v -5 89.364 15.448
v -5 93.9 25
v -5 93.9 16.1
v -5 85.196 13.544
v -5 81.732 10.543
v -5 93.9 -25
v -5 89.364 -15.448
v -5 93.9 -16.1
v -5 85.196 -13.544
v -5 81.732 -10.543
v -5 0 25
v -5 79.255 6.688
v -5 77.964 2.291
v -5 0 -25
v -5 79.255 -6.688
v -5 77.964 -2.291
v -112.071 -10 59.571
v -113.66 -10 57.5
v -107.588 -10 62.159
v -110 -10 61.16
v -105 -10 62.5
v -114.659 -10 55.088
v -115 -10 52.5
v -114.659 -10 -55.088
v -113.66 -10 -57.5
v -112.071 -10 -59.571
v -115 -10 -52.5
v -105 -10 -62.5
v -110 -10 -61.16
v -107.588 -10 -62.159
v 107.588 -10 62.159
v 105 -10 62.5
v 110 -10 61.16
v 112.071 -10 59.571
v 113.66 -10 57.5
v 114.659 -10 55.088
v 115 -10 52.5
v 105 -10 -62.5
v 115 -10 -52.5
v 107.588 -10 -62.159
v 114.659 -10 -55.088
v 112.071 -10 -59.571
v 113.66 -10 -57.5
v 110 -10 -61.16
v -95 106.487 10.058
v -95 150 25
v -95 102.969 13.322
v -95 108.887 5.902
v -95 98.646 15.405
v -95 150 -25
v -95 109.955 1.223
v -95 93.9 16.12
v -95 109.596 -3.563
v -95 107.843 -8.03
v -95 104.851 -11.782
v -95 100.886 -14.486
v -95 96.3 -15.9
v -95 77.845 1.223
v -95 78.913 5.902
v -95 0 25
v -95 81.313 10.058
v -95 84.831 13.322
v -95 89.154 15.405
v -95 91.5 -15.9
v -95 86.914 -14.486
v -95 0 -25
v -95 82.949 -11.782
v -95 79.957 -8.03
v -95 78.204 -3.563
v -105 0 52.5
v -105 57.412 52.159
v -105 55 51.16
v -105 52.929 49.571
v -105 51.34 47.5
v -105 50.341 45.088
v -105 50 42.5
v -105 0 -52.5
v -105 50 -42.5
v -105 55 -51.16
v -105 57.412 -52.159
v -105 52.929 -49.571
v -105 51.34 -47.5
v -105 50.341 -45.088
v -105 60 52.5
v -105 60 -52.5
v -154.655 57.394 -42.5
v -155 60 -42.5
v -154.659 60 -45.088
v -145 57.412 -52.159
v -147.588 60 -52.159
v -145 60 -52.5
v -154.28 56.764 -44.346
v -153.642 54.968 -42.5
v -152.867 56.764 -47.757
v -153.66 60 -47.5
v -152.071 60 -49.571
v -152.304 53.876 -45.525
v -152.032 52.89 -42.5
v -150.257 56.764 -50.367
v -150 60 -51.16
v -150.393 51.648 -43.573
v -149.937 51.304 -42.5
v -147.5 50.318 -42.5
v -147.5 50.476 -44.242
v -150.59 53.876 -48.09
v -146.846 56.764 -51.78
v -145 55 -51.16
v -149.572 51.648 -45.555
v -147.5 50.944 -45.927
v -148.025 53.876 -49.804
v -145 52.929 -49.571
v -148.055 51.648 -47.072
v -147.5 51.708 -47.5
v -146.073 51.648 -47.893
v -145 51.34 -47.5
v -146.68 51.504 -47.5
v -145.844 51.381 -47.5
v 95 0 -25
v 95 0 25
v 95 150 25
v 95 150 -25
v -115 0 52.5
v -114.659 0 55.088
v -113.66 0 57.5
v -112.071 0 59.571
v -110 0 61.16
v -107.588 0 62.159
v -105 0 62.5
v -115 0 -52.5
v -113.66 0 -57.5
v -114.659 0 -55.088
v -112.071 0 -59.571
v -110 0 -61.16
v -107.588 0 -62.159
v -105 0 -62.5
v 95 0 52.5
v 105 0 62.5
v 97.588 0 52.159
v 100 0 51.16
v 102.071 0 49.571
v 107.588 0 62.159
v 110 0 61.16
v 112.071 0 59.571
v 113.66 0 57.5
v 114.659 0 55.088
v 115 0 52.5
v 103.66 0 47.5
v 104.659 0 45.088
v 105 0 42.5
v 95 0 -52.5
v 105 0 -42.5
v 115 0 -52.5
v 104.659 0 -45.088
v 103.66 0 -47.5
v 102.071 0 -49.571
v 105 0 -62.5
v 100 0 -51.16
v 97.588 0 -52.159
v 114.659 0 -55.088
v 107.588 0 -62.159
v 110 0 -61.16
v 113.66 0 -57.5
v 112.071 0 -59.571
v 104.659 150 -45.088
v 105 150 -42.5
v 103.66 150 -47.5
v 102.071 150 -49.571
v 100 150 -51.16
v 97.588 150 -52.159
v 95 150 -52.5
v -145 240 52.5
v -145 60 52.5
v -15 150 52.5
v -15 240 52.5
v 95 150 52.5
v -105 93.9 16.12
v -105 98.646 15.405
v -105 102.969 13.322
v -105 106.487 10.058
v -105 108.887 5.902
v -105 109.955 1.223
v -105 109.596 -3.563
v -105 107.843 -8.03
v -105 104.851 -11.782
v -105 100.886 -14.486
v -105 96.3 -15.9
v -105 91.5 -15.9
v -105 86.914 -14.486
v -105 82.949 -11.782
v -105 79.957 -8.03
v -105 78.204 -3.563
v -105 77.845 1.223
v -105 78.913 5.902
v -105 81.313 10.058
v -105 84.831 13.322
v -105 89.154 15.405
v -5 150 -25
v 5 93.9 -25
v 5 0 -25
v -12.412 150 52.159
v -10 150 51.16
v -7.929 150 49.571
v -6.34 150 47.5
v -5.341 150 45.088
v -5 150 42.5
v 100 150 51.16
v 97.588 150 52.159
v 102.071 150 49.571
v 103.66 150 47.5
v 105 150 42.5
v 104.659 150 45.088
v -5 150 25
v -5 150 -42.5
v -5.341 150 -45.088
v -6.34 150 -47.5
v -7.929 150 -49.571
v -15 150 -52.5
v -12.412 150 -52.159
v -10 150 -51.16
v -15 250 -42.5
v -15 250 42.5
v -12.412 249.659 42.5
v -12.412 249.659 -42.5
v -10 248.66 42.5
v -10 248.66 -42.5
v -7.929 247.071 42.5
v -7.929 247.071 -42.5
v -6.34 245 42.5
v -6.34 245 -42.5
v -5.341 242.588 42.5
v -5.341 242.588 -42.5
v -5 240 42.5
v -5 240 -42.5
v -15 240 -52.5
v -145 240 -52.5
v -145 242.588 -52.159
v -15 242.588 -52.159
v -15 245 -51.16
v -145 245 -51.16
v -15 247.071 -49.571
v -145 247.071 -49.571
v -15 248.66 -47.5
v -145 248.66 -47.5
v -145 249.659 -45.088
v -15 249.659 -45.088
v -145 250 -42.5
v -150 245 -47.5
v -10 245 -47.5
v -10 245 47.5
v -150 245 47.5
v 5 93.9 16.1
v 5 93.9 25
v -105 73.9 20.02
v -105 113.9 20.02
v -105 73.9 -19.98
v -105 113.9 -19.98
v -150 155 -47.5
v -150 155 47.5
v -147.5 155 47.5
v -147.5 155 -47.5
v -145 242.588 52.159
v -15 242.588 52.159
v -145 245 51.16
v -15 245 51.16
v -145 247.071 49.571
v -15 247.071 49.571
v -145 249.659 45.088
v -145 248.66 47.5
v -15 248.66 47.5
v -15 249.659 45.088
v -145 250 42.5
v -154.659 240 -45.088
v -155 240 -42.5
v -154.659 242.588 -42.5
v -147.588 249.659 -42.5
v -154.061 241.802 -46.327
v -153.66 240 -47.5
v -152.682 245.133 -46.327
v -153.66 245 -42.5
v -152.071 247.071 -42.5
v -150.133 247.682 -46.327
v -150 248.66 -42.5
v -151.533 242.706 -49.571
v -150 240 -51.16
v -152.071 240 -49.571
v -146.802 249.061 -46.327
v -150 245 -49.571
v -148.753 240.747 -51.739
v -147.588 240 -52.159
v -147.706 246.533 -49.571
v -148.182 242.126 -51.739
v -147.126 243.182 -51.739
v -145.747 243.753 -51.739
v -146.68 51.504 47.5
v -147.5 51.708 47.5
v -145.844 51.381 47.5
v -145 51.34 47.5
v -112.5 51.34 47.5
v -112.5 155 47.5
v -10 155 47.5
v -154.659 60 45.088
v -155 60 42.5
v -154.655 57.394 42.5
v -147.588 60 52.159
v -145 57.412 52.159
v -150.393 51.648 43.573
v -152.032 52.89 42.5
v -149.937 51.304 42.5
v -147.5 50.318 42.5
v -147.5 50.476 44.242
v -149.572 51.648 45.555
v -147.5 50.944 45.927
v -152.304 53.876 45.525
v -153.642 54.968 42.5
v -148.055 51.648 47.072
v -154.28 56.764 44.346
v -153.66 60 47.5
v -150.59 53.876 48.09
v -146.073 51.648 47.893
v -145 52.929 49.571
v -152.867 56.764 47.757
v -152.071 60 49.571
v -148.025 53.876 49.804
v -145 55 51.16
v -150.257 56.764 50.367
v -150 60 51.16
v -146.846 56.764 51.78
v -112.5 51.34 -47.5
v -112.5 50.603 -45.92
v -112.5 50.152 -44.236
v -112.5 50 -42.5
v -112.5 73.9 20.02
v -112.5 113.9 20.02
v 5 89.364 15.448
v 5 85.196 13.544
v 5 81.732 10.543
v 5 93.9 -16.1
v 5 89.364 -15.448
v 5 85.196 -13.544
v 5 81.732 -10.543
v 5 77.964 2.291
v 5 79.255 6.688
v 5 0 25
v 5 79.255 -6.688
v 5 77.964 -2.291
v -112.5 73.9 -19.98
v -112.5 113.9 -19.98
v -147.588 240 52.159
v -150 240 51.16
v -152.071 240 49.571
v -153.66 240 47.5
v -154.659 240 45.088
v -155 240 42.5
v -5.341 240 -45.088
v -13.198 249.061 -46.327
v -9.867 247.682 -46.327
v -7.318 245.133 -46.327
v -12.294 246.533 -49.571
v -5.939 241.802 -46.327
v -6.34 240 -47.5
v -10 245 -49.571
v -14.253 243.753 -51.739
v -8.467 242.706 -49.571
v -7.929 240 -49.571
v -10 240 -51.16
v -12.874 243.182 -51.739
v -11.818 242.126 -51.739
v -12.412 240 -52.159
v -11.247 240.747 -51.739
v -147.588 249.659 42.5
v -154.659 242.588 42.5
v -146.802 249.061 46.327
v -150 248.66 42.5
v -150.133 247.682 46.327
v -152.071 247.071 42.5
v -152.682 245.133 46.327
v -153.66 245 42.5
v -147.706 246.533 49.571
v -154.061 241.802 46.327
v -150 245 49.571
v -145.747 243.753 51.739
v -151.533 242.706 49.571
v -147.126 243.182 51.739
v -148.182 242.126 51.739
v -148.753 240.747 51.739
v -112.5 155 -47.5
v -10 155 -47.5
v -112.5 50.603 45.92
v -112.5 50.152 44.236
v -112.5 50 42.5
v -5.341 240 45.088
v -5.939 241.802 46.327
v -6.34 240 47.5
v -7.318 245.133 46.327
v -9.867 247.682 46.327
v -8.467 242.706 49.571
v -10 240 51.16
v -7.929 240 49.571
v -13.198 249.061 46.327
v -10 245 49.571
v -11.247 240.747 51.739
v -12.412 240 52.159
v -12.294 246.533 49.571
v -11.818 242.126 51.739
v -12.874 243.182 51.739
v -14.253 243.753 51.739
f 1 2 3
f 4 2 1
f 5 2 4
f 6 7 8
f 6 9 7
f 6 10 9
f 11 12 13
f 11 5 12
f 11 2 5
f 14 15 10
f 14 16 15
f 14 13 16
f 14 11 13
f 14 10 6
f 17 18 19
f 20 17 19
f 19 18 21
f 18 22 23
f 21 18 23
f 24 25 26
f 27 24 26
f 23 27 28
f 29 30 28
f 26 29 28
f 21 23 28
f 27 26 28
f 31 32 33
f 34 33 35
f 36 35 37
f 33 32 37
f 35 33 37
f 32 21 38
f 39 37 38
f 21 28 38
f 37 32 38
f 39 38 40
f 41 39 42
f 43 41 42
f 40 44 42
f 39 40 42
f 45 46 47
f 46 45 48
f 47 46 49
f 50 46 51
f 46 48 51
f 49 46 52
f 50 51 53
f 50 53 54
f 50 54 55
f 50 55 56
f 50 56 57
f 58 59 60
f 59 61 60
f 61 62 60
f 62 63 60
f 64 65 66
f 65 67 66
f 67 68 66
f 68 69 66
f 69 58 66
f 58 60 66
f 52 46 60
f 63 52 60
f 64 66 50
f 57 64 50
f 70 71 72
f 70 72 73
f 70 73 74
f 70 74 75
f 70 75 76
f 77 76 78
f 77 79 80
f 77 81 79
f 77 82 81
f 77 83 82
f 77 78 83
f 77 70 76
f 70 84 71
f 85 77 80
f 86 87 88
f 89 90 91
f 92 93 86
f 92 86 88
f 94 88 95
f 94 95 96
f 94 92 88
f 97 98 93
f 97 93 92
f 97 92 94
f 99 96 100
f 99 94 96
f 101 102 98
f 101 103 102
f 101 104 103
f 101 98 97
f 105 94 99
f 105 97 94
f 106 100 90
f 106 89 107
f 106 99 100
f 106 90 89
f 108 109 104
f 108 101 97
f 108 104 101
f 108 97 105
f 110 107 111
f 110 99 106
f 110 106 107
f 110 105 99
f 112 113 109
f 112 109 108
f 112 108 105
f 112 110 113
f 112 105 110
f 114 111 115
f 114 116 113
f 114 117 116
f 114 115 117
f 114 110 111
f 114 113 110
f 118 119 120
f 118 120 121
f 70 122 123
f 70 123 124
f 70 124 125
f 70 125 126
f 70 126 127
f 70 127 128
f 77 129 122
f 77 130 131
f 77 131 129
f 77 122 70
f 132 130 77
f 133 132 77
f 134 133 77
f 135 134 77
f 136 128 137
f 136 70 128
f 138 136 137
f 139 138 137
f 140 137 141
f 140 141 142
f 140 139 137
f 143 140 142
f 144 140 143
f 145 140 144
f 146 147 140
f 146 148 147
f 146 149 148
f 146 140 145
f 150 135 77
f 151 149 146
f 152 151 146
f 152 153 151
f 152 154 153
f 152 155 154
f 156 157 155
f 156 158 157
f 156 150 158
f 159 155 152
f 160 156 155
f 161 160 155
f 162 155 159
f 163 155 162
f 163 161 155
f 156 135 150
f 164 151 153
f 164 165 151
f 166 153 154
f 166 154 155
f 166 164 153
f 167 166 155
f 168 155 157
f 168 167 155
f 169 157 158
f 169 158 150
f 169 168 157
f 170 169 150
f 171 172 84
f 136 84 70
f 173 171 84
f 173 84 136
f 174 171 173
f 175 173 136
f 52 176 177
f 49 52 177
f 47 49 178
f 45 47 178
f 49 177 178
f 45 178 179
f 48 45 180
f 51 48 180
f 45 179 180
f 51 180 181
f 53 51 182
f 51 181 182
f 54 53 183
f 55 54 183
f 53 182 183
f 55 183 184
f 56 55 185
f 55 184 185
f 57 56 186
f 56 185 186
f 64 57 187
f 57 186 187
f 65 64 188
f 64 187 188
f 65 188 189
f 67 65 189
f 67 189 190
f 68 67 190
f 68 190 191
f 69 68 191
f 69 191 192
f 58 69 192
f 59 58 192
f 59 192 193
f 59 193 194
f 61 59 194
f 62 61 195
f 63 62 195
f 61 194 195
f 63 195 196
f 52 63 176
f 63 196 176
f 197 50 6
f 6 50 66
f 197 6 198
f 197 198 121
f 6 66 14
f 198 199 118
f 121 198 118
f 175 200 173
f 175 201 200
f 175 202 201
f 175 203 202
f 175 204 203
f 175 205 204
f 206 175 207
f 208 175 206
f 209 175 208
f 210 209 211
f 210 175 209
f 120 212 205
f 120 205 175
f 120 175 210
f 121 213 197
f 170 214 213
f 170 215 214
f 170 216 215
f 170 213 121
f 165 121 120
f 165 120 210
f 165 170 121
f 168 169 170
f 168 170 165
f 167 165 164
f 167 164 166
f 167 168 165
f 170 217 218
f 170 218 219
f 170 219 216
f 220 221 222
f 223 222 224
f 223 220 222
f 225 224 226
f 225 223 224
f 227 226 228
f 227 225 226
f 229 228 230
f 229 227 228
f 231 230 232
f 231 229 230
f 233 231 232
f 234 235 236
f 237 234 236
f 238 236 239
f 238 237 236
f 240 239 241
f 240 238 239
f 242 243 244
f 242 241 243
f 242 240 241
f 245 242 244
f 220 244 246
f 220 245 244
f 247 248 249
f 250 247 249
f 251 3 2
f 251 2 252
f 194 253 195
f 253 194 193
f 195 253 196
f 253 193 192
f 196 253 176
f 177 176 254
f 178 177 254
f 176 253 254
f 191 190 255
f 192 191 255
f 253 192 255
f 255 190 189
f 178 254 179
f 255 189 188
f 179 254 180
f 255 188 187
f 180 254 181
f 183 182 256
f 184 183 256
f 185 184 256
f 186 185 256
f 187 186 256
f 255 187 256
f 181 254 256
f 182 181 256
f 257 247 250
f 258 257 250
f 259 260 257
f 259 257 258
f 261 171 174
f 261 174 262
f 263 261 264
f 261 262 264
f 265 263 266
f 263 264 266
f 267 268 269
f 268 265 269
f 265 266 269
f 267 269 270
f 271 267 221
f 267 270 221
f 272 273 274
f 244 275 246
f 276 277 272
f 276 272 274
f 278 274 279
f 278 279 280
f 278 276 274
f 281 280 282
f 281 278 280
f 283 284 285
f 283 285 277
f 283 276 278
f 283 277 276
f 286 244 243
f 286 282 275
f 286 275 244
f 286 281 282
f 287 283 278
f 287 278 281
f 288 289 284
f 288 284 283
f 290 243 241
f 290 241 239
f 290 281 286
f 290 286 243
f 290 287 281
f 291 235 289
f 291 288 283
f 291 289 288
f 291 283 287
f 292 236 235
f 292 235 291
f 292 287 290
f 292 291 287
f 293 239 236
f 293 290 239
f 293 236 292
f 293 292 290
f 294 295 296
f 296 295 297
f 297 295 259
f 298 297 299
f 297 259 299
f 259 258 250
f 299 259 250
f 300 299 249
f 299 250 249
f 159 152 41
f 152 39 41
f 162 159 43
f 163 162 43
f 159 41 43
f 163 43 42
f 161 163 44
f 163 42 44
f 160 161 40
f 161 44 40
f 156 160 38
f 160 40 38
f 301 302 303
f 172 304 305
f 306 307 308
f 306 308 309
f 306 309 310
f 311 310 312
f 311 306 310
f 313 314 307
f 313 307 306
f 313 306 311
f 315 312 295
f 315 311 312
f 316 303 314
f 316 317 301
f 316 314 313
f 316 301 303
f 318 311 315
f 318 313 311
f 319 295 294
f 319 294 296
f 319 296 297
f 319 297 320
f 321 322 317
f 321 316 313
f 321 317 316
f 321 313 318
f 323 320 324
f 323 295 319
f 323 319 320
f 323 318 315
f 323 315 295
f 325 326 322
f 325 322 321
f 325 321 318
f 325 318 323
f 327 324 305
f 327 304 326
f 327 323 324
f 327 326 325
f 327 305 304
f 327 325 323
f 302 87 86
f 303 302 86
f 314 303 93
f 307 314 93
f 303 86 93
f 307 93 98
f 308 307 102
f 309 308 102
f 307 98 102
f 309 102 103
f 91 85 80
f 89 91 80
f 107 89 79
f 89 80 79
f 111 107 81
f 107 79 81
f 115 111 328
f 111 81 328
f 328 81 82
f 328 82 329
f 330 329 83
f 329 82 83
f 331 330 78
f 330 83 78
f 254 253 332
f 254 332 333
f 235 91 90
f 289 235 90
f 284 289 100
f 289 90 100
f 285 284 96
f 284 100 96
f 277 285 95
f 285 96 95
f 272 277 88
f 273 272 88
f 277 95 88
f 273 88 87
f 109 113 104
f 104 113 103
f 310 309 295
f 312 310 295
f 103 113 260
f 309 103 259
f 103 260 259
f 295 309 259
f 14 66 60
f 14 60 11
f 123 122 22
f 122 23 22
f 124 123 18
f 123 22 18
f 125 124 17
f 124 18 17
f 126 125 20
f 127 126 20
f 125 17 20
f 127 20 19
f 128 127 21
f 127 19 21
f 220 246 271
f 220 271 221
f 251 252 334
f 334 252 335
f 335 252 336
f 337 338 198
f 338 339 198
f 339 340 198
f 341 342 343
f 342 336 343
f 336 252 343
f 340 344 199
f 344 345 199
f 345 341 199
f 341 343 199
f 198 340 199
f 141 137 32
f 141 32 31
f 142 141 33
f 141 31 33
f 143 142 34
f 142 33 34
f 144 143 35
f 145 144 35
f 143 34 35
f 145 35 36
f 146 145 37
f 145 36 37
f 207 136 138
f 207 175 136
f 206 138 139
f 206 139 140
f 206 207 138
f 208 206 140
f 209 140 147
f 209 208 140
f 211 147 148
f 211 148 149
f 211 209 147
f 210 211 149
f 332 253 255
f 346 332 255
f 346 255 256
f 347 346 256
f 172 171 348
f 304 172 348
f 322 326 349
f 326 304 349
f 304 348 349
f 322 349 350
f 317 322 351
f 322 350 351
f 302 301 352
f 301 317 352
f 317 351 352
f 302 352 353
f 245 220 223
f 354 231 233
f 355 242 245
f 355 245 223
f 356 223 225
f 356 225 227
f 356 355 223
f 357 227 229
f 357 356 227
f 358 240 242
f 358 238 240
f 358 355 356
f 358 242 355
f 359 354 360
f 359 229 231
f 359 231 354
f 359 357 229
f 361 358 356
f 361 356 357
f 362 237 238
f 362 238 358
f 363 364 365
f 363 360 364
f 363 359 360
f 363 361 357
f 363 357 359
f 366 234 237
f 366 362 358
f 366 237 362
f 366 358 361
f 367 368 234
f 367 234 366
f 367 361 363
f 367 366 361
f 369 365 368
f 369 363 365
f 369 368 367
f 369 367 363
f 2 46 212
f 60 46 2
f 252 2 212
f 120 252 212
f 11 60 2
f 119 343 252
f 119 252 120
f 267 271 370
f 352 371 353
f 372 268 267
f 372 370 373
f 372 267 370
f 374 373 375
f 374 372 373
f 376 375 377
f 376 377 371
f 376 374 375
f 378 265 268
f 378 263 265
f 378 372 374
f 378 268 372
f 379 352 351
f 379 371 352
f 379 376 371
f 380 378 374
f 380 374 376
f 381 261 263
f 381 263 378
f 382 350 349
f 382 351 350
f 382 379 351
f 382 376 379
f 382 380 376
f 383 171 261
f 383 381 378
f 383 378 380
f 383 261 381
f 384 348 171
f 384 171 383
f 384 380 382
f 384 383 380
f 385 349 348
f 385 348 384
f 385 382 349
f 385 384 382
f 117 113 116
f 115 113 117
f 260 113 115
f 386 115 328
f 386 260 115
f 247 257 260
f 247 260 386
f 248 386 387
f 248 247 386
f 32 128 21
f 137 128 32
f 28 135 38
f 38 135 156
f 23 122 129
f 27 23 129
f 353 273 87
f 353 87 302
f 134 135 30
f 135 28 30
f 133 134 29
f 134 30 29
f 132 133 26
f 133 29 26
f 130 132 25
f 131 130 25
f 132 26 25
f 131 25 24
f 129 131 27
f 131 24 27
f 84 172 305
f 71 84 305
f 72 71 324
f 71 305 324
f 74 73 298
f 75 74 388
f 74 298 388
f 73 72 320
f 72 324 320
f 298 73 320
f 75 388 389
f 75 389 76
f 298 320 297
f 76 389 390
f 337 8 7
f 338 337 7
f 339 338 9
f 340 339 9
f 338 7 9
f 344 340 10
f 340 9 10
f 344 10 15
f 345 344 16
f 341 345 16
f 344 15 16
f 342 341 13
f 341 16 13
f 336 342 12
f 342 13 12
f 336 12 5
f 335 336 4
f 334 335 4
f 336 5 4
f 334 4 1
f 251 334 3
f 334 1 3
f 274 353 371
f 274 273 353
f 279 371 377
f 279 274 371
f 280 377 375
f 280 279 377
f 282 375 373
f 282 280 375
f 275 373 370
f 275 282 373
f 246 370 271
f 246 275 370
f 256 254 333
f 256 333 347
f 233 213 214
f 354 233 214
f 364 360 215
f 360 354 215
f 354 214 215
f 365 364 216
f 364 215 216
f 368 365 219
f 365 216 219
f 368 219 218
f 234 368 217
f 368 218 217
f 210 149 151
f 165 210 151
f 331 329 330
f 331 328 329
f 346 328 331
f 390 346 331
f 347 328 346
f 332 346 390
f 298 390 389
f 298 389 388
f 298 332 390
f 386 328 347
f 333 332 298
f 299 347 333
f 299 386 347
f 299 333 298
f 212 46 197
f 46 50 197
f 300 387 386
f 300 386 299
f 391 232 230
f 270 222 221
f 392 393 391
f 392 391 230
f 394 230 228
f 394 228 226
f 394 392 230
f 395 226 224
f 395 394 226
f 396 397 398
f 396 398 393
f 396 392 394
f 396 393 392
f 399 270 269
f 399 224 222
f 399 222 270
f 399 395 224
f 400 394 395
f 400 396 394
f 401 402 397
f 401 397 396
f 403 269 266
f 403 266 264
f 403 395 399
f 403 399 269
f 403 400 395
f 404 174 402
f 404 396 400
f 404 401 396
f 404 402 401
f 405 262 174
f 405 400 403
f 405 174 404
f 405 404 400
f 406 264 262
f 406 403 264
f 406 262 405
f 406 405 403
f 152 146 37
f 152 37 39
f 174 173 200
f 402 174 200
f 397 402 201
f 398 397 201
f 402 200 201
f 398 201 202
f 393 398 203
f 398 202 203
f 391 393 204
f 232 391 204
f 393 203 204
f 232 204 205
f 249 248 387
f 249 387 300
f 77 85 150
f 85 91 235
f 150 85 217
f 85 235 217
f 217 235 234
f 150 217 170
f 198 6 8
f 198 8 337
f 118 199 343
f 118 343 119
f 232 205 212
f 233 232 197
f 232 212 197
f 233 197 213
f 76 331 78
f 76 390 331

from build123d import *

# Parameters (mm, degrees)
SKETCH2_W               = 210
SKETCH2_H               = 105
SKETCH2_W_2             = 190
SKETCH2_H_2             = 50
BOSS_EXTRUDE2_DEPTH     = 150
FILLET3_R               = 10
FILLET4_R               = 10
SKETCH4_W               = 230
SKETCH4_H               = 125
BOSS_EXTRUDE3_DEPTH     = 10
FILLET5_R               = 10
FILLET6_R               = 10
FILLET7_R               = 10
FILLET8_R               = 10
SKETCH7_W               = 10
SKETCH7_H               = 50
BOSS_EXTRUDE4_DEPTH     = 93.9
SKETCH8_R               = 16.1
CUT_EXTRUDE2_DEPTH      = 10
SKETCH10_R              = 16.1
CUT_EXTRUDE3_DEPTH      = 10
SKETCH14_W              = 150
SKETCH14_H              = 105
BOSS_EXTRUDE6_DEPTH     = 100
CUT_EXTRUDE4_DEPTH      = 1
CUT_EXTRUDE4_DEPTH_BACK = 145
SKETCH19_W              = 95
SKETCH19_H              = 90
SKETCH22_W              = 50
SKETCH22_H              = 105
SKETCH22_W_2            = 35
SKETCH22_H_2            = 95
BOSS_EXTRUDE7_DEPTH     = 100
SKETCH24_W              = 40
SKETCH24_H              = 40
CUT_EXTRUDE5_DEPTH      = 10
SKETCH25_W              = 95.055428317
SKETCH25_H              = 90
BOSS_EXTRUDE9_DEPTH     = 5
FILLET9_R               = 10
FILLET10_R              = 10
FILLET11_R              = 10
FILLET12_R              = 10
FILLET13_R              = 10
FILLET15_R              = 10
SKETCH28_W              = 35
SKETCH28_H              = 95
CUT_EXTRUDE7_DEPTH      = 5


with BuildPart() as part:
    # Sketch2 → Boss-Extrude2 (new body)
    with BuildSketch(Plane(origin=(0, 0, 0), x_dir=(1, 0, 0), z_dir=(0, 1, 0))):
        Rectangle(SKETCH2_W, SKETCH2_H)
        Rectangle(SKETCH2_W_2, SKETCH2_H_2, mode=Mode.SUBTRACT)
    extrude(amount=BOSS_EXTRUDE2_DEPTH)

    # Fillet3
    fillet3_edges = [part.edges().sort_by_distance(p)[0] for p in [
        (105, 75, 52.5),
    ]]
    fillet(fillet3_edges, radius=FILLET3_R)

    # Fillet4
    fillet4_edges = [part.edges().sort_by_distance(p)[0] for p in [
        (105, 75, -52.5),
    ]]
    fillet(fillet4_edges, radius=FILLET4_R)

    # Sketch4 → Boss-Extrude3 (add)
    with BuildSketch(Plane(origin=(0, 0, 0), x_dir=(1, 0, 0), z_dir=(0, 1, 0))):
        Rectangle(SKETCH4_W, SKETCH4_H)
    extrude(amount=-BOSS_EXTRUDE3_DEPTH)

    # Fillet5
    fillet5_edges = [part.edges().sort_by_distance(p)[0] for p in [
        (115, -5, 62.5),
    ]]
    fillet(fillet5_edges, radius=FILLET5_R)

    # Fillet6
    fillet6_edges = [part.edges().sort_by_distance(p)[0] for p in [
        (115, -5, -62.5),
    ]]
    fillet(fillet6_edges, radius=FILLET6_R)

    # Fillet7
    fillet7_edges = [part.edges().sort_by_distance(p)[0] for p in [
        (-115, -5, -62.5),
    ]]
    fillet(fillet7_edges, radius=FILLET7_R)

    # Fillet8
    fillet8_edges = [part.edges().sort_by_distance(p)[0] for p in [
        (-115, -5, 62.5),
    ]]
    fillet(fillet8_edges, radius=FILLET8_R)

    # Sketch7 → Boss-Extrude4 (add)
    with BuildSketch(Plane(origin=(0, 0, 0), x_dir=(1, 0, 0), z_dir=(0, 1, 0))):
        Rectangle(SKETCH7_W, SKETCH7_H)
    extrude(amount=BOSS_EXTRUDE4_DEPTH)

    # Sketch8 → Cut-Extrude2 (cut)
    with BuildSketch(Plane.ZY.offset(5)):
        with Locations((0, 93.9)):
            Circle(SKETCH8_R)
    extrude(amount=-CUT_EXTRUDE2_DEPTH, mode=Mode.SUBTRACT)

    # Sketch10 → Cut-Extrude3 (cut)
    with BuildSketch(Plane.ZY.offset(105)):
        with Locations((0.019819576, 93.900003501)):
            Circle(SKETCH10_R)
    extrude(amount=-CUT_EXTRUDE3_DEPTH, mode=Mode.SUBTRACT)

    # Sketch14 → Boss-Extrude6 (add)
    with BuildSketch(Plane(origin=(0, 150, 0), x_dir=(1, 0, 0), z_dir=(0, 1, 0))):
        with Locations((-80, 0)):
            Rectangle(SKETCH14_W, SKETCH14_H)
    extrude(amount=BOSS_EXTRUDE6_DEPTH)

    # Sketch19 → Cut-Extrude4 (cut, two sides: drawn at the far end of the back side and taken through both)
    with BuildSketch(Plane.ZY.offset(155).offset(-CUT_EXTRUDE4_DEPTH_BACK)):
        with Locations((0, 200)):
            Rectangle(SKETCH19_W, SKETCH19_H)
    extrude(amount=CUT_EXTRUDE4_DEPTH + CUT_EXTRUDE4_DEPTH_BACK, mode=Mode.SUBTRACT)

    # Sketch22 → Boss-Extrude7 (add)
    with BuildSketch(Plane.XZ.offset(-150)):
        with Locations((-130, 0)):
            Rectangle(SKETCH22_W, SKETCH22_H)
        with Locations((-130, 0)):
            Rectangle(SKETCH22_W_2, SKETCH22_H_2, mode=Mode.SUBTRACT)
    extrude(amount=BOSS_EXTRUDE7_DEPTH)

    # Sketch24 → Cut-Extrude5 (cut)
    with BuildSketch(Plane(origin=(-105, 0, 0), x_dir=(0, 0, -1), z_dir=(1, 0, 0))):
        with Locations((-0.019819576, 93.900003501)):
            Rectangle(SKETCH24_W, SKETCH24_H)
    extrude(amount=-CUT_EXTRUDE5_DEPTH, mode=Mode.SUBTRACT)

    # Sketch25 → Boss-Extrude9 (add)
    with BuildSketch(Plane.ZY.offset(155)):
        with Locations((0.027714159, 200)):
            Rectangle(SKETCH25_W, SKETCH25_H)
    extrude(amount=-BOSS_EXTRUDE9_DEPTH)

    # Fillet9
    fillet9_edges = [part.edges().sort_by_distance(p)[0] for p in [
        (-80, 250, -52.5),
        (-155, 250, 0),
        (-80, 250, 52.5),
        (-5, 250, 0),
    ]]
    fillet(fillet9_edges, radius=FILLET9_R)

    # Fillet10
    # the kernel refuses this fillet: 10 mm, written as the material it takes off along each edge
    with BuildSketch(Plane(origin=(-145, 240, 42.5), x_dir=(-1, 0, 0), z_dir=(0, 0, 1))) as fillet10_piece_1_section:
        Polygon((0, 0), (FILLET10_R, 0), (FILLET10_R, -FILLET10_R), (0, -FILLET10_R), align=None)
    fillet10_piece_1 = extrude(amount=FILLET10_R, mode=Mode.PRIVATE)
    fillet10_piece_1 = fillet10_piece_1 - Plane(origin=(-145, 240, 42.5), x_dir=(0.7071067811865475, -0.7071067811865475, 0), z_dir=(0, 0, 1)) * Sphere(FILLET10_R, mode=Mode.PRIVATE)
    add(fillet10_piece_1, mode=Mode.SUBTRACT)
    with BuildSketch(Plane(origin=(-155, 240, 52.5), x_dir=(1, 0, 0), z_dir=(0, -1, 0))) as fillet10_piece_2:
        with BuildLine():
            CenterArc((FILLET10_R, -FILLET10_R), FILLET10_R, 90, 90)
            Line((0, -FILLET10_R), (0, 0))
            Line((0, 0), (FILLET10_R, 0))
        make_face()
    extrude(amount=215, mode=Mode.SUBTRACT)

    # Fillet11
    # the kernel refuses this fillet: 10 mm, written as the material it takes off along each edge
    with BuildSketch(Plane(origin=(-145, 240, -42.5), x_dir=(-1, 0, 0), z_dir=(0, 0, -1))) as fillet11_piece_1_section:
        Polygon((0, 0), (FILLET11_R, 0), (FILLET11_R, FILLET11_R), (0, FILLET11_R), align=None)
    fillet11_piece_1 = extrude(amount=FILLET11_R, mode=Mode.PRIVATE)
    fillet11_piece_1 = fillet11_piece_1 - Plane(origin=(-145, 240, -42.5), x_dir=(0.7071067811865475, -0.7071067811865475, 0), z_dir=(0, 0, -1)) * Sphere(FILLET11_R, mode=Mode.PRIVATE)
    add(fillet11_piece_1, mode=Mode.SUBTRACT)
    with BuildSketch(Plane(origin=(-155, 25, -52.5), x_dir=(1, 0, 0), z_dir=(0, 1, 0))) as fillet11_piece_2:
        with BuildLine():
            CenterArc((FILLET11_R, -FILLET11_R), FILLET11_R, 90, 90)
            Line((0, -FILLET11_R), (0, 0))
            Line((0, 0), (FILLET11_R, 0))
        make_face()
    extrude(amount=215, mode=Mode.SUBTRACT)

    # Fillet12
    # the kernel refuses this fillet: 10 mm, written as the material it takes off along each edge
    with BuildSketch(Plane(origin=(-15, 240, 42.5), x_dir=(1, 0, 0), z_dir=(0, 0, 1))) as fillet12_piece_1_section:
        Polygon((0, 0), (FILLET12_R, 0), (FILLET12_R, FILLET12_R), (0, FILLET12_R), align=None)
    fillet12_piece_1 = extrude(amount=FILLET12_R, mode=Mode.PRIVATE)
    fillet12_piece_1 = fillet12_piece_1 - Plane(origin=(-15, 240, 42.5), x_dir=(-0.7071067811865475, -0.7071067811865475, 0), z_dir=(0, 0, 1)) * Sphere(FILLET12_R, mode=Mode.PRIVATE)
    add(fillet12_piece_1, mode=Mode.SUBTRACT)
    with BuildSketch(Plane(origin=(-5, 150, 52.5), x_dir=(-1, 0, 0), z_dir=(0, 1, 0))) as fillet12_piece_2:
        with BuildLine():
            CenterArc((FILLET12_R, -FILLET12_R), FILLET12_R, 90, 90)
            Line((0, -FILLET12_R), (0, 0))
            Line((0, 0), (FILLET12_R, 0))
        make_face()
    extrude(amount=90, mode=Mode.SUBTRACT)

    # Fillet13
    # the kernel refuses this fillet: 10 mm, written as the material it takes off along each edge
    with BuildSketch(Plane(origin=(-15, 240, -42.5), x_dir=(1, 0, 0), z_dir=(0, 0, -1))) as fillet13_piece_1_section:
        Polygon((0, 0), (FILLET13_R, 0), (FILLET13_R, -FILLET13_R), (0, -FILLET13_R), align=None)
    fillet13_piece_1 = extrude(amount=FILLET13_R, mode=Mode.PRIVATE)
    fillet13_piece_1 = fillet13_piece_1 - Plane(origin=(-15, 240, -42.5), x_dir=(-0.7071067811865475, -0.7071067811865475, 0), z_dir=(0, 0, -1)) * Sphere(FILLET13_R, mode=Mode.PRIVATE)
    add(fillet13_piece_1, mode=Mode.SUBTRACT)
    with BuildSketch(Plane(origin=(-5, 150, -52.5), x_dir=(-1, 0, 0), z_dir=(0, 1, 0))) as fillet13_piece_2:
        with BuildLine():
            CenterArc((FILLET13_R, FILLET13_R), FILLET13_R, 180, 90)
            Line((0, FILLET13_R), (0, 0))
            Line((0, 0), (FILLET13_R, 0))
        make_face()
    extrude(amount=90, mode=Mode.SUBTRACT)

    # Fillet15
    # the kernel refuses this fillet: 10 mm, written as the material it takes off along each edge
    with BuildSketch(Plane(origin=(-145, 50, 52.5), x_dir=(0, 1, 0), z_dir=(1, 0, 0)), Plane(origin=(-105, 50, -52.5), x_dir=(0, 1, 0), z_dir=(-1, 0, 0))) as fillet15_piece_1:
        with BuildLine():
            CenterArc((FILLET15_R, -FILLET15_R), FILLET15_R, 90, 90)
            Line((0, -FILLET15_R), (0, 0))
            Line((0, 0), (FILLET15_R, 0))
        make_face()
    extrude(amount=40, mode=Mode.SUBTRACT)
    with BuildSketch(Plane(origin=(-155, 50, -42.5), x_dir=(0, 1, 0), z_dir=(0, 0, 1))) as fillet15_piece_2:
        with BuildLine():
            CenterArc((FILLET15_R, -FILLET15_R), FILLET15_R, 90, 90)
            Line((0, -FILLET15_R), (0, 0))
            Line((0, 0), (FILLET15_R, 0))
        make_face()
    extrude(amount=85, mode=Mode.SUBTRACT)
    with BuildSketch(Plane(origin=(-145, 50, 42.5), x_dir=(-1, 0, 0), z_dir=(0, 0, -1))) as fillet15_piece_3:
        with BuildLine():
            CenterArc((10 - FILLET15_R, FILLET15_R), FILLET15_R, 270, 90)
            Line((10, FILLET15_R), (10, 0))
            Line((10, 0), (10 - FILLET15_R, 0))
        make_face()
    revolve(axis=Axis((-145, 50, 42.5), (0, 1, 0)), revolution_arc=90, mode=Mode.SUBTRACT)
    with BuildSketch(Plane(origin=(-145, 50, -42.5), x_dir=(-1, 0, 0), z_dir=(0, 0, 1))) as fillet15_piece_4:
        with BuildLine():
            CenterArc((10 - FILLET15_R, -FILLET15_R), FILLET15_R, 0, 90)
            Line((10 - FILLET15_R, 0), (10, 0))
            Line((10, 0), (10, -FILLET15_R))
        make_face()
    revolve(axis=Axis((-145, 50, -42.5), (0, -1, 0)), revolution_arc=90, mode=Mode.SUBTRACT)

    # Sketch28 → Cut-Extrude7 (cut)
    with BuildSketch(Plane.XZ.offset(-150)):
        with Locations((-130, 0)):
            Rectangle(SKETCH28_W, SKETCH28_H)
    extrude(amount=-CUT_EXTRUDE7_DEPTH, mode=Mode.SUBTRACT)


solid = part.part
